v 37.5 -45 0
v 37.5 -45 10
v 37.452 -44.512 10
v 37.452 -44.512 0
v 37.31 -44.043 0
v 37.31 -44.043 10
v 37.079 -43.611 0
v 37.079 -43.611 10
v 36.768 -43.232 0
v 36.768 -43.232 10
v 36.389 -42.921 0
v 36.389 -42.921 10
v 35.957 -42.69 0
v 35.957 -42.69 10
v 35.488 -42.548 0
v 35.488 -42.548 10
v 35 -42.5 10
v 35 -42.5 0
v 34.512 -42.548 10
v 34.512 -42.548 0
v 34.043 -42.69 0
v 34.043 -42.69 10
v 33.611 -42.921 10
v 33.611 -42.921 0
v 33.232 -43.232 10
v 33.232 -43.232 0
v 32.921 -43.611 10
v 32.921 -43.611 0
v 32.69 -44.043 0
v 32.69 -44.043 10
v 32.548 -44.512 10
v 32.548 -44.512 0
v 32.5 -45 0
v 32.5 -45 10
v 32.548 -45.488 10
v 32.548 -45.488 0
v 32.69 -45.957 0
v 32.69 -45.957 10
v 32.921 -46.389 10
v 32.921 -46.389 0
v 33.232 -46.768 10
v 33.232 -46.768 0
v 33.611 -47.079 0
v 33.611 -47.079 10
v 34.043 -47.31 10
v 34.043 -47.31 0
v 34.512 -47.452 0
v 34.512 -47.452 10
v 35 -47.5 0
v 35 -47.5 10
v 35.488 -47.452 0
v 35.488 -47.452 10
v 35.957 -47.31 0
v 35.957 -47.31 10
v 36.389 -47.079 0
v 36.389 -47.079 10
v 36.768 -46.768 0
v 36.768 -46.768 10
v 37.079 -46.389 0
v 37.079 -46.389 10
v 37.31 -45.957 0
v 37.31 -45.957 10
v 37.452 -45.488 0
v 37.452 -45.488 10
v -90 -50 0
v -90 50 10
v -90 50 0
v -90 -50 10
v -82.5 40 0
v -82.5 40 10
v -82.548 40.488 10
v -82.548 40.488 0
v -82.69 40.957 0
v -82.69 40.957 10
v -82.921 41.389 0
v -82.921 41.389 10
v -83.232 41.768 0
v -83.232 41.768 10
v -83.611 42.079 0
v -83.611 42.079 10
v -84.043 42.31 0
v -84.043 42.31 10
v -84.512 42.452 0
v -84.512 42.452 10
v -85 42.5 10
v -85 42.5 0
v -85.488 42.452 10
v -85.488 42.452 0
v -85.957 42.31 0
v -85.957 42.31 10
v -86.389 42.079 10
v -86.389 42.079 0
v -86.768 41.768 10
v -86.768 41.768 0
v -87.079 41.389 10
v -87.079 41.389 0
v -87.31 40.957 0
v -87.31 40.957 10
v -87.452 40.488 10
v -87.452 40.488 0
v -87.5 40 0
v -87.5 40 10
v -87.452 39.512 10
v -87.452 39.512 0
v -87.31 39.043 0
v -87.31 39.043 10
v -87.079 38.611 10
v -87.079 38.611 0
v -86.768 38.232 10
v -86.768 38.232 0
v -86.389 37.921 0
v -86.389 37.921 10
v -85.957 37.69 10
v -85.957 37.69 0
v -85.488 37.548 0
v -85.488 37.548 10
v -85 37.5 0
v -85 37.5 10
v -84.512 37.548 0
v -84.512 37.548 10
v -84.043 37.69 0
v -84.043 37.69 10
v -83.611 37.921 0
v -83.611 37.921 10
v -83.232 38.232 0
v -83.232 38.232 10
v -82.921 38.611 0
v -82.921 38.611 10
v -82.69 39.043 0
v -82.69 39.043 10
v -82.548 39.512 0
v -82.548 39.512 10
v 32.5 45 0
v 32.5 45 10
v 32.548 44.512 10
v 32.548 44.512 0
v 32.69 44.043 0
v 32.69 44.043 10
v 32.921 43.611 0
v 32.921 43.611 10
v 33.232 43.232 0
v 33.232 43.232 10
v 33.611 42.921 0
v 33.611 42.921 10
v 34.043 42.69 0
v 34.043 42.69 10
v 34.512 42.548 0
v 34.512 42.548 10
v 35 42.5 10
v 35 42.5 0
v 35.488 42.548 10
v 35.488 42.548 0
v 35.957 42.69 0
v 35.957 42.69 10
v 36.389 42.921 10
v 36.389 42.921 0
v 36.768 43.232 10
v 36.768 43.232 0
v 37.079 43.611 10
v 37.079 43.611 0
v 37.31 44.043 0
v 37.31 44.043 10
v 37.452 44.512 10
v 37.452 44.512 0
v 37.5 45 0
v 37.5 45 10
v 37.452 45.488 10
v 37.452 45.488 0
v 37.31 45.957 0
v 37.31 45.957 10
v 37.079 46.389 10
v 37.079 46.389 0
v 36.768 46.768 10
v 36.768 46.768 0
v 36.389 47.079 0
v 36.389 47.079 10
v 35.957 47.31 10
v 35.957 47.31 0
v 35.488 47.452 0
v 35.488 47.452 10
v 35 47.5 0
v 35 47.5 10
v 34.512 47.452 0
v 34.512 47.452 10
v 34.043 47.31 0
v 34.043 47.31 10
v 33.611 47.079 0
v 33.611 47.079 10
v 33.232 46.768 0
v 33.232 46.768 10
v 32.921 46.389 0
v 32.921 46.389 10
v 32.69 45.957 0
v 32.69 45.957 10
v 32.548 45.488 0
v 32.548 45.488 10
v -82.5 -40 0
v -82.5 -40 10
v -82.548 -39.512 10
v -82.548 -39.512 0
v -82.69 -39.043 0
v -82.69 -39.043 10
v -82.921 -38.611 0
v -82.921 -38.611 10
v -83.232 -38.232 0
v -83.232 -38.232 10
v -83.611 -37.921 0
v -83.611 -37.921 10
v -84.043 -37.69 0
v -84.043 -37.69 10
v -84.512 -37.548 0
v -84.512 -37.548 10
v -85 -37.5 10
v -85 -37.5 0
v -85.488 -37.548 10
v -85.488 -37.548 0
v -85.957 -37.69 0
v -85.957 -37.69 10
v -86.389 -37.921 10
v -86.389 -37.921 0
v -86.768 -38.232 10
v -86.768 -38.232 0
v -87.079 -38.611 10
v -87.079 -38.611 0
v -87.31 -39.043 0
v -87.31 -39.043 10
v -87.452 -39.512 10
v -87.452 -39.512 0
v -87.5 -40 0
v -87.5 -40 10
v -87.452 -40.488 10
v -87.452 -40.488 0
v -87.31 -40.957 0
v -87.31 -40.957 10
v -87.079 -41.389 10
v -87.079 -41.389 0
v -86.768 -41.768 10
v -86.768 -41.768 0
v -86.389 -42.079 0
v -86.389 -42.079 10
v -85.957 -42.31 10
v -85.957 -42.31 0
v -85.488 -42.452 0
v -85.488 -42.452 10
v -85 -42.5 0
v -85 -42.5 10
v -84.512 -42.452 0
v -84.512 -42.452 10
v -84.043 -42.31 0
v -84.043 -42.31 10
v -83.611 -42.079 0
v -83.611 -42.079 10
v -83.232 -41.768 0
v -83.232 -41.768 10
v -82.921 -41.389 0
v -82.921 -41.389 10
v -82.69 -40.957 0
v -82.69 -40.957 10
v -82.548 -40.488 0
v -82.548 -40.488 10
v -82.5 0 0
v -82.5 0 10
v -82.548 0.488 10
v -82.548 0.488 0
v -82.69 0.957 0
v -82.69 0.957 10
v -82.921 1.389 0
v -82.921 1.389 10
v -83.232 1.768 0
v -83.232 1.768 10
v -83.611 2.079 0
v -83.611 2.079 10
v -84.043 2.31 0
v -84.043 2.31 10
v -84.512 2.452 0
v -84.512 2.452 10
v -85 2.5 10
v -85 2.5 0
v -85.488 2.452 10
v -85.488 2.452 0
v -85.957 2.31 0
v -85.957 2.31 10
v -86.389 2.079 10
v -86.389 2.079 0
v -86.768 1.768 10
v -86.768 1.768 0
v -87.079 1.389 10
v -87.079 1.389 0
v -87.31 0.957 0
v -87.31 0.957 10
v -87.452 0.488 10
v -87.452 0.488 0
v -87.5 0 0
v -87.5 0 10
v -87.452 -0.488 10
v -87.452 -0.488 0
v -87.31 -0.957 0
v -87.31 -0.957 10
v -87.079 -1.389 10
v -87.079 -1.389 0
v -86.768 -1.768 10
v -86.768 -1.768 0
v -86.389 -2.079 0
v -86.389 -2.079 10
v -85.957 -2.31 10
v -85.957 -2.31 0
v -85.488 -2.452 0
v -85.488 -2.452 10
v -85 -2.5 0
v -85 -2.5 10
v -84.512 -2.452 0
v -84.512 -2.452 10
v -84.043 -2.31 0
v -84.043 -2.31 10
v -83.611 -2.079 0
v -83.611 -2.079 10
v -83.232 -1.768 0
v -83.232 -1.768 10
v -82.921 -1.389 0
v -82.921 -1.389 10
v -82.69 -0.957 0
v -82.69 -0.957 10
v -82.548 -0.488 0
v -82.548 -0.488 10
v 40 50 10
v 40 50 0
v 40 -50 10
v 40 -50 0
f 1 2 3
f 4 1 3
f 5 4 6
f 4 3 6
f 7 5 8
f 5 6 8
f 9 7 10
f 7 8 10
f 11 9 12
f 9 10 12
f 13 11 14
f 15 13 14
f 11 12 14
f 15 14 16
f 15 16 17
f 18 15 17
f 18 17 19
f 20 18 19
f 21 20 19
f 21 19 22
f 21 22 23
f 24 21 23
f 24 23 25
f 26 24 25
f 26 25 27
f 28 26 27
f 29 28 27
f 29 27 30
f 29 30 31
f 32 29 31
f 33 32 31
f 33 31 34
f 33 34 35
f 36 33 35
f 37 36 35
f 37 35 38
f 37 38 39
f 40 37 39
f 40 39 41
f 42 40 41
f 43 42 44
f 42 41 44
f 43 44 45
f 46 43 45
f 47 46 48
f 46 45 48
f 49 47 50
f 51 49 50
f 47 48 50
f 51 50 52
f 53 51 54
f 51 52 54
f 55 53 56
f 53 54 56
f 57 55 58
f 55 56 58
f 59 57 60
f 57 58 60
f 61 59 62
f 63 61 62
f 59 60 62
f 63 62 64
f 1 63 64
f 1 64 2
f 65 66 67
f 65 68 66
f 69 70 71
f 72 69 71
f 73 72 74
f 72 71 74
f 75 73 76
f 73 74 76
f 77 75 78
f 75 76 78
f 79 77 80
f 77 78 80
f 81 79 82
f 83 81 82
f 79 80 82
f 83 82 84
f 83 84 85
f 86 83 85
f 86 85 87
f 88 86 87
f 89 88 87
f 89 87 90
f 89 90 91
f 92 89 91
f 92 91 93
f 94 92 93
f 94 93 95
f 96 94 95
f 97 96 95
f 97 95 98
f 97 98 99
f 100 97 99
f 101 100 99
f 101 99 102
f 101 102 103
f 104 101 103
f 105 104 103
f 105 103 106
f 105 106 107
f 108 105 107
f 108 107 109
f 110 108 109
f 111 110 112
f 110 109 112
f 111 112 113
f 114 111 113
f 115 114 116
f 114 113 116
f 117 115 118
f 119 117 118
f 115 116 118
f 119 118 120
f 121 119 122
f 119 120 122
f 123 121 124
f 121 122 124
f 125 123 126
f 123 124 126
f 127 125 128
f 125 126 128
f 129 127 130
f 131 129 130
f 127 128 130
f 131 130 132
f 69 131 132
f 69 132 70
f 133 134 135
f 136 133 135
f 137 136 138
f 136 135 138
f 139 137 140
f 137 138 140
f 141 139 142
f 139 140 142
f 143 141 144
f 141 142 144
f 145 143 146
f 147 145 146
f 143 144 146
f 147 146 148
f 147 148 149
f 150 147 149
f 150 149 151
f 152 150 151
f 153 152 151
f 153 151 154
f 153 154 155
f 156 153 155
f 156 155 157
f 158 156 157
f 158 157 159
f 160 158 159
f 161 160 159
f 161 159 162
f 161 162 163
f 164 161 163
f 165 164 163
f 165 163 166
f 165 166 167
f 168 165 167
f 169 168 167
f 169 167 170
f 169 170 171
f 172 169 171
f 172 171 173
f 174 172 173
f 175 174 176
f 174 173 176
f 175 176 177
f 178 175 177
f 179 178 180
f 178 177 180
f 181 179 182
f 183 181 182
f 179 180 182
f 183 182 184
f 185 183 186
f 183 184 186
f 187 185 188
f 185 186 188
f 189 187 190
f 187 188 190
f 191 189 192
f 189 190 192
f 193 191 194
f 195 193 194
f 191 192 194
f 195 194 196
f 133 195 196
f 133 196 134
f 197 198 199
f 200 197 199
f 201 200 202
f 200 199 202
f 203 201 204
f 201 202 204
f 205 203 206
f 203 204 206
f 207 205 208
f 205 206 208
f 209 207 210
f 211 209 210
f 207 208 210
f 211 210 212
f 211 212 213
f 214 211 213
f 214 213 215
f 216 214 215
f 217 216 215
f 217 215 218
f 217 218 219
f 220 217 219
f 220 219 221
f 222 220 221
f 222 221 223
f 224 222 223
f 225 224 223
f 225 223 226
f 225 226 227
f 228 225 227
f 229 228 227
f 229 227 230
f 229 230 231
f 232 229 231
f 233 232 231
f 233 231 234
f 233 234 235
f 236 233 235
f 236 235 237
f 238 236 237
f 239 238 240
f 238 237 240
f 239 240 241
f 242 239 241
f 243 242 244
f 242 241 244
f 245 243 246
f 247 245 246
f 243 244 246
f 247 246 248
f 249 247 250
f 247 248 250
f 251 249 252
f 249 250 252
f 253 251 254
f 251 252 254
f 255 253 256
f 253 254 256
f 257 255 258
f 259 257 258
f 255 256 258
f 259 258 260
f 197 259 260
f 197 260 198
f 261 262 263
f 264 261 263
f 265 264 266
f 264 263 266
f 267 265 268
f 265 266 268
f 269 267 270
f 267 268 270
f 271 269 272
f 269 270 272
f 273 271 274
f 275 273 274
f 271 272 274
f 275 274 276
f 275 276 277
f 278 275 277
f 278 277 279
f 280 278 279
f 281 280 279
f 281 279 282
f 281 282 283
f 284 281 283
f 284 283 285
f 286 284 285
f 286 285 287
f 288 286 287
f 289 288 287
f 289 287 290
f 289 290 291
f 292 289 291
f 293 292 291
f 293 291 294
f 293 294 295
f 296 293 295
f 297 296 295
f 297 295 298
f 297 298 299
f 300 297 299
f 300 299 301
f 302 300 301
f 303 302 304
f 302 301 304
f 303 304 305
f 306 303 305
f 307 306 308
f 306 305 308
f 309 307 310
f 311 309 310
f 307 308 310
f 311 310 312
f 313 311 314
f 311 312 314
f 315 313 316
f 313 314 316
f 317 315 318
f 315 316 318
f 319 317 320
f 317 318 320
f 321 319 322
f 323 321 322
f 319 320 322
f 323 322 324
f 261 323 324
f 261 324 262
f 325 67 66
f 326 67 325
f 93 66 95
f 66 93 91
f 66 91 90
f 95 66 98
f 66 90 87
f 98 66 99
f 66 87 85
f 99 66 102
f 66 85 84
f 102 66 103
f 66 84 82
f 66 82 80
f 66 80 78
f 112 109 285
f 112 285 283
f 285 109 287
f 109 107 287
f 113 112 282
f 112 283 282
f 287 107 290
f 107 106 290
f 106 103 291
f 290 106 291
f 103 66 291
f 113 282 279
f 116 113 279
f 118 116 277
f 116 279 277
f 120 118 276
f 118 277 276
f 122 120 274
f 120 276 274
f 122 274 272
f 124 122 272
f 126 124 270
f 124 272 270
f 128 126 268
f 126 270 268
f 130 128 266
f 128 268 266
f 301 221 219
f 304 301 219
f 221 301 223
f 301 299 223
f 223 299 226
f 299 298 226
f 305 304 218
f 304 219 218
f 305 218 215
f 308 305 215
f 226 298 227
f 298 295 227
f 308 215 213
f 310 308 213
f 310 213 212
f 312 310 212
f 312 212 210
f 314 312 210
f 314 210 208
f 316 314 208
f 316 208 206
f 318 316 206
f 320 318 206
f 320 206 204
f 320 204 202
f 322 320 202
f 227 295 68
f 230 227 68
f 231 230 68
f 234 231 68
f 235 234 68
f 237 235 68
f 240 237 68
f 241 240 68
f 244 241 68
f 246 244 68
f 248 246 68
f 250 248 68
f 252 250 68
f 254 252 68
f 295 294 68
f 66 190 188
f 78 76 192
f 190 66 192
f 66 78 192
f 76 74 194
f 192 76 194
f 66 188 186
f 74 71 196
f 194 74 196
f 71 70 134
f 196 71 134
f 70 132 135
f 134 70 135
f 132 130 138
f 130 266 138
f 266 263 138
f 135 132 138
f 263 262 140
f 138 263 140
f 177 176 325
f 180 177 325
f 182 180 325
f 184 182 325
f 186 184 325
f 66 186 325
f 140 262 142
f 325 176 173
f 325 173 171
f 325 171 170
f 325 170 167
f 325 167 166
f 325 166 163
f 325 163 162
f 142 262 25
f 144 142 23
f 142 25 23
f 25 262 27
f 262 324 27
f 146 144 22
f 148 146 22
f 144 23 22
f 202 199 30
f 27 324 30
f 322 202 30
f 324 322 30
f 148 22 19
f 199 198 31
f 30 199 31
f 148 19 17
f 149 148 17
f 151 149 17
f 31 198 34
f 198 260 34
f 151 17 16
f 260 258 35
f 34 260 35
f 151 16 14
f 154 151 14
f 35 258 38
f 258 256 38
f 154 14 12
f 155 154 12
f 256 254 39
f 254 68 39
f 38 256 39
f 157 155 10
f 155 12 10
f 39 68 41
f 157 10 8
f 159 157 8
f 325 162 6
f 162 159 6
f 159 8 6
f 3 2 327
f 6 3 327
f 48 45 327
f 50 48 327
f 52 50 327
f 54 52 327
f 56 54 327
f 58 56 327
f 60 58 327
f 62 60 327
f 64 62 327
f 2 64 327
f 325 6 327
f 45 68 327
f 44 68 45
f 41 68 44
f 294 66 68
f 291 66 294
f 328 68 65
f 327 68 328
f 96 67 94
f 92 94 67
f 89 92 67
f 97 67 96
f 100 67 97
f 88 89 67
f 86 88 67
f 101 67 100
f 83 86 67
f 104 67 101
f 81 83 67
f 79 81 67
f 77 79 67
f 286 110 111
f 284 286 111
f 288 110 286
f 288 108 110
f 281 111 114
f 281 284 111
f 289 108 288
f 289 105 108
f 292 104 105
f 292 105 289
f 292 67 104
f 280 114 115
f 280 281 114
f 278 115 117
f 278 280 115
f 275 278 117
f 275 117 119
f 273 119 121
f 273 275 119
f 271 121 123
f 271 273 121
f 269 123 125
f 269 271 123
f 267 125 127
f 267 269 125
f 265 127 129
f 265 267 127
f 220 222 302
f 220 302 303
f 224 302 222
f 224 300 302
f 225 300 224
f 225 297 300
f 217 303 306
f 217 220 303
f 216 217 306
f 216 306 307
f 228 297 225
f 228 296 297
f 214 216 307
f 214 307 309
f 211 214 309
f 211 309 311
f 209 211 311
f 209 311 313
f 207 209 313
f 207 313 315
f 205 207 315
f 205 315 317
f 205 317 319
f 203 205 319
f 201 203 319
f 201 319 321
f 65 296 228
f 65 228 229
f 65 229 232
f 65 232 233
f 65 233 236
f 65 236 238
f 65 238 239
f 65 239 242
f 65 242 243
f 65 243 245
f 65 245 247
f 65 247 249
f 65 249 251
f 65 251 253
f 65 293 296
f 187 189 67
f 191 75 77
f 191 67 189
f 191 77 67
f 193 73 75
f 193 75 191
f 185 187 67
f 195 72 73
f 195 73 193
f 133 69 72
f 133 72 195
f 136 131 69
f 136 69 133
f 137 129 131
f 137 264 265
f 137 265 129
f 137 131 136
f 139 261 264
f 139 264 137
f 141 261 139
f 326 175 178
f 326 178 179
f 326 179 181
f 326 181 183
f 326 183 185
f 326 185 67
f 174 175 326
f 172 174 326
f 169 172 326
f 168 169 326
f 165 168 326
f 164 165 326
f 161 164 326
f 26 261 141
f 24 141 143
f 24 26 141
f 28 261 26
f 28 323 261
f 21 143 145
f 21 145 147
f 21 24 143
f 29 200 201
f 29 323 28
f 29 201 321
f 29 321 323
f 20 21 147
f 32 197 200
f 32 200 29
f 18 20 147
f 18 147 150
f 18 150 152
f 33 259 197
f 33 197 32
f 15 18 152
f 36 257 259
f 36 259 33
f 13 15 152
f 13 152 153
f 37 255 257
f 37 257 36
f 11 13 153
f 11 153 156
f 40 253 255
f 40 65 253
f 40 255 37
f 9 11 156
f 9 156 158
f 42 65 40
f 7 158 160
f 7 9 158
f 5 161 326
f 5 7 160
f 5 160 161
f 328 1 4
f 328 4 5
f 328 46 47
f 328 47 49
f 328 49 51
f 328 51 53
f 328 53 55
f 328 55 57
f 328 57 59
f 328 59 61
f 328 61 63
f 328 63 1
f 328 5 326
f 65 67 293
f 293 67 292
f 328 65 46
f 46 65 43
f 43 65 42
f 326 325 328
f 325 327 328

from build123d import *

# Parameters (mm, degrees)
SKETCH_1_W          = 80
SKETCH_1_H          = 40
EXTRUDE_2_DEPTH     = 10
SKETCH_4_W          = 10
SKETCH_4_H          = 40
EXTRUDE_3_DEPTH     = 50
SKETCH_5_R          = 2.5
CUT_EXTRUDE_2_DEPTH = 93.736184955
SKETCH_6_W          = 130
SKETCH_6_H          = 10
EXTRUDE_4_DEPTH     = 30
SKETCH_7_W          = 130
SKETCH_7_H          = 10
EXTRUDE_5_DEPTH     = 30
SKETCH_8_R          = 2.5
CUT_EXTRUDE_3_DEPTH = 104.440804328
SKETCH_10_R         = 2.5
CUT_EXTRUDE_4_DEPTH = 104.440804328


with BuildPart() as part:
    # 草图1 → 凸台-拉伸2 (new body)
    with BuildSketch(Plane.XY):
        Rectangle(SKETCH_1_W, SKETCH_1_H)
    extrude(amount=EXTRUDE_2_DEPTH)

    # 草图4 → 凸台-拉伸3 (add)
    with BuildSketch(Plane.ZY.offset(40)):
        with Locations((5, 0)):
            Rectangle(SKETCH_4_W, SKETCH_4_H)
    extrude(amount=EXTRUDE_3_DEPTH)

    # 草图5 → 切除-拉伸2 (cut, through all)
    with BuildSketch(Plane.XY.offset(10)):
        with Locations((-85, 0)):
            Circle(SKETCH_5_R)
    extrude(amount=-CUT_EXTRUDE_2_DEPTH, mode=Mode.SUBTRACT)

    # 草图6 → 凸台-拉伸4 (add)
    with BuildSketch(Plane.XZ.offset(20)):
        with Locations((-25, 5)):
            Rectangle(SKETCH_6_W, SKETCH_6_H)
    extrude(amount=EXTRUDE_4_DEPTH)

    # 草图7 → 凸台-拉伸5 (add)
    with BuildSketch(Plane(origin=(0, 20, 0), x_dir=(1, 0, 0), z_dir=(0, 1, 0))):
        with Locations((-25, -5)):
            Rectangle(SKETCH_7_W, SKETCH_7_H)
    extrude(amount=EXTRUDE_5_DEPTH)

    # 草图8 → 切除-拉伸3 (cut, through all)
    with BuildSketch(Plane.XY.offset(10)):
        with Locations((35, -45)):
            Circle(SKETCH_8_R)
        with Locations(Location((35, 45, 0), (0, 0, 180))):
            Circle(SKETCH_8_R)
    extrude(amount=-CUT_EXTRUDE_3_DEPTH, mode=Mode.SUBTRACT)

    # 草图10 → 切除-拉伸4 (cut, through all)
    with BuildSketch(Plane.XY.offset(10)):
        with Locations((-85, 40)):
            Circle(SKETCH_10_R)
        with Locations((-85, -40)):
            Circle(SKETCH_10_R)
    extrude(amount=-CUT_EXTRUDE_4_DEPTH, mode=Mode.SUBTRACT)


solid = part.part
